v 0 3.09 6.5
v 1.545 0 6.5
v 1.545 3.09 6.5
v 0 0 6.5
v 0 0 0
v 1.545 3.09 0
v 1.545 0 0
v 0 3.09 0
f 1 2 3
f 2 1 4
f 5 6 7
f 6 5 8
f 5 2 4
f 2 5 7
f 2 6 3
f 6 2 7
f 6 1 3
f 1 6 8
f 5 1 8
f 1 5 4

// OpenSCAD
// Generated by SolidPython 1.0.4 on 2021-01-27 23:13:17


cube(size = [1.5450000000, 3.0900000000, 6.5000000000]);
